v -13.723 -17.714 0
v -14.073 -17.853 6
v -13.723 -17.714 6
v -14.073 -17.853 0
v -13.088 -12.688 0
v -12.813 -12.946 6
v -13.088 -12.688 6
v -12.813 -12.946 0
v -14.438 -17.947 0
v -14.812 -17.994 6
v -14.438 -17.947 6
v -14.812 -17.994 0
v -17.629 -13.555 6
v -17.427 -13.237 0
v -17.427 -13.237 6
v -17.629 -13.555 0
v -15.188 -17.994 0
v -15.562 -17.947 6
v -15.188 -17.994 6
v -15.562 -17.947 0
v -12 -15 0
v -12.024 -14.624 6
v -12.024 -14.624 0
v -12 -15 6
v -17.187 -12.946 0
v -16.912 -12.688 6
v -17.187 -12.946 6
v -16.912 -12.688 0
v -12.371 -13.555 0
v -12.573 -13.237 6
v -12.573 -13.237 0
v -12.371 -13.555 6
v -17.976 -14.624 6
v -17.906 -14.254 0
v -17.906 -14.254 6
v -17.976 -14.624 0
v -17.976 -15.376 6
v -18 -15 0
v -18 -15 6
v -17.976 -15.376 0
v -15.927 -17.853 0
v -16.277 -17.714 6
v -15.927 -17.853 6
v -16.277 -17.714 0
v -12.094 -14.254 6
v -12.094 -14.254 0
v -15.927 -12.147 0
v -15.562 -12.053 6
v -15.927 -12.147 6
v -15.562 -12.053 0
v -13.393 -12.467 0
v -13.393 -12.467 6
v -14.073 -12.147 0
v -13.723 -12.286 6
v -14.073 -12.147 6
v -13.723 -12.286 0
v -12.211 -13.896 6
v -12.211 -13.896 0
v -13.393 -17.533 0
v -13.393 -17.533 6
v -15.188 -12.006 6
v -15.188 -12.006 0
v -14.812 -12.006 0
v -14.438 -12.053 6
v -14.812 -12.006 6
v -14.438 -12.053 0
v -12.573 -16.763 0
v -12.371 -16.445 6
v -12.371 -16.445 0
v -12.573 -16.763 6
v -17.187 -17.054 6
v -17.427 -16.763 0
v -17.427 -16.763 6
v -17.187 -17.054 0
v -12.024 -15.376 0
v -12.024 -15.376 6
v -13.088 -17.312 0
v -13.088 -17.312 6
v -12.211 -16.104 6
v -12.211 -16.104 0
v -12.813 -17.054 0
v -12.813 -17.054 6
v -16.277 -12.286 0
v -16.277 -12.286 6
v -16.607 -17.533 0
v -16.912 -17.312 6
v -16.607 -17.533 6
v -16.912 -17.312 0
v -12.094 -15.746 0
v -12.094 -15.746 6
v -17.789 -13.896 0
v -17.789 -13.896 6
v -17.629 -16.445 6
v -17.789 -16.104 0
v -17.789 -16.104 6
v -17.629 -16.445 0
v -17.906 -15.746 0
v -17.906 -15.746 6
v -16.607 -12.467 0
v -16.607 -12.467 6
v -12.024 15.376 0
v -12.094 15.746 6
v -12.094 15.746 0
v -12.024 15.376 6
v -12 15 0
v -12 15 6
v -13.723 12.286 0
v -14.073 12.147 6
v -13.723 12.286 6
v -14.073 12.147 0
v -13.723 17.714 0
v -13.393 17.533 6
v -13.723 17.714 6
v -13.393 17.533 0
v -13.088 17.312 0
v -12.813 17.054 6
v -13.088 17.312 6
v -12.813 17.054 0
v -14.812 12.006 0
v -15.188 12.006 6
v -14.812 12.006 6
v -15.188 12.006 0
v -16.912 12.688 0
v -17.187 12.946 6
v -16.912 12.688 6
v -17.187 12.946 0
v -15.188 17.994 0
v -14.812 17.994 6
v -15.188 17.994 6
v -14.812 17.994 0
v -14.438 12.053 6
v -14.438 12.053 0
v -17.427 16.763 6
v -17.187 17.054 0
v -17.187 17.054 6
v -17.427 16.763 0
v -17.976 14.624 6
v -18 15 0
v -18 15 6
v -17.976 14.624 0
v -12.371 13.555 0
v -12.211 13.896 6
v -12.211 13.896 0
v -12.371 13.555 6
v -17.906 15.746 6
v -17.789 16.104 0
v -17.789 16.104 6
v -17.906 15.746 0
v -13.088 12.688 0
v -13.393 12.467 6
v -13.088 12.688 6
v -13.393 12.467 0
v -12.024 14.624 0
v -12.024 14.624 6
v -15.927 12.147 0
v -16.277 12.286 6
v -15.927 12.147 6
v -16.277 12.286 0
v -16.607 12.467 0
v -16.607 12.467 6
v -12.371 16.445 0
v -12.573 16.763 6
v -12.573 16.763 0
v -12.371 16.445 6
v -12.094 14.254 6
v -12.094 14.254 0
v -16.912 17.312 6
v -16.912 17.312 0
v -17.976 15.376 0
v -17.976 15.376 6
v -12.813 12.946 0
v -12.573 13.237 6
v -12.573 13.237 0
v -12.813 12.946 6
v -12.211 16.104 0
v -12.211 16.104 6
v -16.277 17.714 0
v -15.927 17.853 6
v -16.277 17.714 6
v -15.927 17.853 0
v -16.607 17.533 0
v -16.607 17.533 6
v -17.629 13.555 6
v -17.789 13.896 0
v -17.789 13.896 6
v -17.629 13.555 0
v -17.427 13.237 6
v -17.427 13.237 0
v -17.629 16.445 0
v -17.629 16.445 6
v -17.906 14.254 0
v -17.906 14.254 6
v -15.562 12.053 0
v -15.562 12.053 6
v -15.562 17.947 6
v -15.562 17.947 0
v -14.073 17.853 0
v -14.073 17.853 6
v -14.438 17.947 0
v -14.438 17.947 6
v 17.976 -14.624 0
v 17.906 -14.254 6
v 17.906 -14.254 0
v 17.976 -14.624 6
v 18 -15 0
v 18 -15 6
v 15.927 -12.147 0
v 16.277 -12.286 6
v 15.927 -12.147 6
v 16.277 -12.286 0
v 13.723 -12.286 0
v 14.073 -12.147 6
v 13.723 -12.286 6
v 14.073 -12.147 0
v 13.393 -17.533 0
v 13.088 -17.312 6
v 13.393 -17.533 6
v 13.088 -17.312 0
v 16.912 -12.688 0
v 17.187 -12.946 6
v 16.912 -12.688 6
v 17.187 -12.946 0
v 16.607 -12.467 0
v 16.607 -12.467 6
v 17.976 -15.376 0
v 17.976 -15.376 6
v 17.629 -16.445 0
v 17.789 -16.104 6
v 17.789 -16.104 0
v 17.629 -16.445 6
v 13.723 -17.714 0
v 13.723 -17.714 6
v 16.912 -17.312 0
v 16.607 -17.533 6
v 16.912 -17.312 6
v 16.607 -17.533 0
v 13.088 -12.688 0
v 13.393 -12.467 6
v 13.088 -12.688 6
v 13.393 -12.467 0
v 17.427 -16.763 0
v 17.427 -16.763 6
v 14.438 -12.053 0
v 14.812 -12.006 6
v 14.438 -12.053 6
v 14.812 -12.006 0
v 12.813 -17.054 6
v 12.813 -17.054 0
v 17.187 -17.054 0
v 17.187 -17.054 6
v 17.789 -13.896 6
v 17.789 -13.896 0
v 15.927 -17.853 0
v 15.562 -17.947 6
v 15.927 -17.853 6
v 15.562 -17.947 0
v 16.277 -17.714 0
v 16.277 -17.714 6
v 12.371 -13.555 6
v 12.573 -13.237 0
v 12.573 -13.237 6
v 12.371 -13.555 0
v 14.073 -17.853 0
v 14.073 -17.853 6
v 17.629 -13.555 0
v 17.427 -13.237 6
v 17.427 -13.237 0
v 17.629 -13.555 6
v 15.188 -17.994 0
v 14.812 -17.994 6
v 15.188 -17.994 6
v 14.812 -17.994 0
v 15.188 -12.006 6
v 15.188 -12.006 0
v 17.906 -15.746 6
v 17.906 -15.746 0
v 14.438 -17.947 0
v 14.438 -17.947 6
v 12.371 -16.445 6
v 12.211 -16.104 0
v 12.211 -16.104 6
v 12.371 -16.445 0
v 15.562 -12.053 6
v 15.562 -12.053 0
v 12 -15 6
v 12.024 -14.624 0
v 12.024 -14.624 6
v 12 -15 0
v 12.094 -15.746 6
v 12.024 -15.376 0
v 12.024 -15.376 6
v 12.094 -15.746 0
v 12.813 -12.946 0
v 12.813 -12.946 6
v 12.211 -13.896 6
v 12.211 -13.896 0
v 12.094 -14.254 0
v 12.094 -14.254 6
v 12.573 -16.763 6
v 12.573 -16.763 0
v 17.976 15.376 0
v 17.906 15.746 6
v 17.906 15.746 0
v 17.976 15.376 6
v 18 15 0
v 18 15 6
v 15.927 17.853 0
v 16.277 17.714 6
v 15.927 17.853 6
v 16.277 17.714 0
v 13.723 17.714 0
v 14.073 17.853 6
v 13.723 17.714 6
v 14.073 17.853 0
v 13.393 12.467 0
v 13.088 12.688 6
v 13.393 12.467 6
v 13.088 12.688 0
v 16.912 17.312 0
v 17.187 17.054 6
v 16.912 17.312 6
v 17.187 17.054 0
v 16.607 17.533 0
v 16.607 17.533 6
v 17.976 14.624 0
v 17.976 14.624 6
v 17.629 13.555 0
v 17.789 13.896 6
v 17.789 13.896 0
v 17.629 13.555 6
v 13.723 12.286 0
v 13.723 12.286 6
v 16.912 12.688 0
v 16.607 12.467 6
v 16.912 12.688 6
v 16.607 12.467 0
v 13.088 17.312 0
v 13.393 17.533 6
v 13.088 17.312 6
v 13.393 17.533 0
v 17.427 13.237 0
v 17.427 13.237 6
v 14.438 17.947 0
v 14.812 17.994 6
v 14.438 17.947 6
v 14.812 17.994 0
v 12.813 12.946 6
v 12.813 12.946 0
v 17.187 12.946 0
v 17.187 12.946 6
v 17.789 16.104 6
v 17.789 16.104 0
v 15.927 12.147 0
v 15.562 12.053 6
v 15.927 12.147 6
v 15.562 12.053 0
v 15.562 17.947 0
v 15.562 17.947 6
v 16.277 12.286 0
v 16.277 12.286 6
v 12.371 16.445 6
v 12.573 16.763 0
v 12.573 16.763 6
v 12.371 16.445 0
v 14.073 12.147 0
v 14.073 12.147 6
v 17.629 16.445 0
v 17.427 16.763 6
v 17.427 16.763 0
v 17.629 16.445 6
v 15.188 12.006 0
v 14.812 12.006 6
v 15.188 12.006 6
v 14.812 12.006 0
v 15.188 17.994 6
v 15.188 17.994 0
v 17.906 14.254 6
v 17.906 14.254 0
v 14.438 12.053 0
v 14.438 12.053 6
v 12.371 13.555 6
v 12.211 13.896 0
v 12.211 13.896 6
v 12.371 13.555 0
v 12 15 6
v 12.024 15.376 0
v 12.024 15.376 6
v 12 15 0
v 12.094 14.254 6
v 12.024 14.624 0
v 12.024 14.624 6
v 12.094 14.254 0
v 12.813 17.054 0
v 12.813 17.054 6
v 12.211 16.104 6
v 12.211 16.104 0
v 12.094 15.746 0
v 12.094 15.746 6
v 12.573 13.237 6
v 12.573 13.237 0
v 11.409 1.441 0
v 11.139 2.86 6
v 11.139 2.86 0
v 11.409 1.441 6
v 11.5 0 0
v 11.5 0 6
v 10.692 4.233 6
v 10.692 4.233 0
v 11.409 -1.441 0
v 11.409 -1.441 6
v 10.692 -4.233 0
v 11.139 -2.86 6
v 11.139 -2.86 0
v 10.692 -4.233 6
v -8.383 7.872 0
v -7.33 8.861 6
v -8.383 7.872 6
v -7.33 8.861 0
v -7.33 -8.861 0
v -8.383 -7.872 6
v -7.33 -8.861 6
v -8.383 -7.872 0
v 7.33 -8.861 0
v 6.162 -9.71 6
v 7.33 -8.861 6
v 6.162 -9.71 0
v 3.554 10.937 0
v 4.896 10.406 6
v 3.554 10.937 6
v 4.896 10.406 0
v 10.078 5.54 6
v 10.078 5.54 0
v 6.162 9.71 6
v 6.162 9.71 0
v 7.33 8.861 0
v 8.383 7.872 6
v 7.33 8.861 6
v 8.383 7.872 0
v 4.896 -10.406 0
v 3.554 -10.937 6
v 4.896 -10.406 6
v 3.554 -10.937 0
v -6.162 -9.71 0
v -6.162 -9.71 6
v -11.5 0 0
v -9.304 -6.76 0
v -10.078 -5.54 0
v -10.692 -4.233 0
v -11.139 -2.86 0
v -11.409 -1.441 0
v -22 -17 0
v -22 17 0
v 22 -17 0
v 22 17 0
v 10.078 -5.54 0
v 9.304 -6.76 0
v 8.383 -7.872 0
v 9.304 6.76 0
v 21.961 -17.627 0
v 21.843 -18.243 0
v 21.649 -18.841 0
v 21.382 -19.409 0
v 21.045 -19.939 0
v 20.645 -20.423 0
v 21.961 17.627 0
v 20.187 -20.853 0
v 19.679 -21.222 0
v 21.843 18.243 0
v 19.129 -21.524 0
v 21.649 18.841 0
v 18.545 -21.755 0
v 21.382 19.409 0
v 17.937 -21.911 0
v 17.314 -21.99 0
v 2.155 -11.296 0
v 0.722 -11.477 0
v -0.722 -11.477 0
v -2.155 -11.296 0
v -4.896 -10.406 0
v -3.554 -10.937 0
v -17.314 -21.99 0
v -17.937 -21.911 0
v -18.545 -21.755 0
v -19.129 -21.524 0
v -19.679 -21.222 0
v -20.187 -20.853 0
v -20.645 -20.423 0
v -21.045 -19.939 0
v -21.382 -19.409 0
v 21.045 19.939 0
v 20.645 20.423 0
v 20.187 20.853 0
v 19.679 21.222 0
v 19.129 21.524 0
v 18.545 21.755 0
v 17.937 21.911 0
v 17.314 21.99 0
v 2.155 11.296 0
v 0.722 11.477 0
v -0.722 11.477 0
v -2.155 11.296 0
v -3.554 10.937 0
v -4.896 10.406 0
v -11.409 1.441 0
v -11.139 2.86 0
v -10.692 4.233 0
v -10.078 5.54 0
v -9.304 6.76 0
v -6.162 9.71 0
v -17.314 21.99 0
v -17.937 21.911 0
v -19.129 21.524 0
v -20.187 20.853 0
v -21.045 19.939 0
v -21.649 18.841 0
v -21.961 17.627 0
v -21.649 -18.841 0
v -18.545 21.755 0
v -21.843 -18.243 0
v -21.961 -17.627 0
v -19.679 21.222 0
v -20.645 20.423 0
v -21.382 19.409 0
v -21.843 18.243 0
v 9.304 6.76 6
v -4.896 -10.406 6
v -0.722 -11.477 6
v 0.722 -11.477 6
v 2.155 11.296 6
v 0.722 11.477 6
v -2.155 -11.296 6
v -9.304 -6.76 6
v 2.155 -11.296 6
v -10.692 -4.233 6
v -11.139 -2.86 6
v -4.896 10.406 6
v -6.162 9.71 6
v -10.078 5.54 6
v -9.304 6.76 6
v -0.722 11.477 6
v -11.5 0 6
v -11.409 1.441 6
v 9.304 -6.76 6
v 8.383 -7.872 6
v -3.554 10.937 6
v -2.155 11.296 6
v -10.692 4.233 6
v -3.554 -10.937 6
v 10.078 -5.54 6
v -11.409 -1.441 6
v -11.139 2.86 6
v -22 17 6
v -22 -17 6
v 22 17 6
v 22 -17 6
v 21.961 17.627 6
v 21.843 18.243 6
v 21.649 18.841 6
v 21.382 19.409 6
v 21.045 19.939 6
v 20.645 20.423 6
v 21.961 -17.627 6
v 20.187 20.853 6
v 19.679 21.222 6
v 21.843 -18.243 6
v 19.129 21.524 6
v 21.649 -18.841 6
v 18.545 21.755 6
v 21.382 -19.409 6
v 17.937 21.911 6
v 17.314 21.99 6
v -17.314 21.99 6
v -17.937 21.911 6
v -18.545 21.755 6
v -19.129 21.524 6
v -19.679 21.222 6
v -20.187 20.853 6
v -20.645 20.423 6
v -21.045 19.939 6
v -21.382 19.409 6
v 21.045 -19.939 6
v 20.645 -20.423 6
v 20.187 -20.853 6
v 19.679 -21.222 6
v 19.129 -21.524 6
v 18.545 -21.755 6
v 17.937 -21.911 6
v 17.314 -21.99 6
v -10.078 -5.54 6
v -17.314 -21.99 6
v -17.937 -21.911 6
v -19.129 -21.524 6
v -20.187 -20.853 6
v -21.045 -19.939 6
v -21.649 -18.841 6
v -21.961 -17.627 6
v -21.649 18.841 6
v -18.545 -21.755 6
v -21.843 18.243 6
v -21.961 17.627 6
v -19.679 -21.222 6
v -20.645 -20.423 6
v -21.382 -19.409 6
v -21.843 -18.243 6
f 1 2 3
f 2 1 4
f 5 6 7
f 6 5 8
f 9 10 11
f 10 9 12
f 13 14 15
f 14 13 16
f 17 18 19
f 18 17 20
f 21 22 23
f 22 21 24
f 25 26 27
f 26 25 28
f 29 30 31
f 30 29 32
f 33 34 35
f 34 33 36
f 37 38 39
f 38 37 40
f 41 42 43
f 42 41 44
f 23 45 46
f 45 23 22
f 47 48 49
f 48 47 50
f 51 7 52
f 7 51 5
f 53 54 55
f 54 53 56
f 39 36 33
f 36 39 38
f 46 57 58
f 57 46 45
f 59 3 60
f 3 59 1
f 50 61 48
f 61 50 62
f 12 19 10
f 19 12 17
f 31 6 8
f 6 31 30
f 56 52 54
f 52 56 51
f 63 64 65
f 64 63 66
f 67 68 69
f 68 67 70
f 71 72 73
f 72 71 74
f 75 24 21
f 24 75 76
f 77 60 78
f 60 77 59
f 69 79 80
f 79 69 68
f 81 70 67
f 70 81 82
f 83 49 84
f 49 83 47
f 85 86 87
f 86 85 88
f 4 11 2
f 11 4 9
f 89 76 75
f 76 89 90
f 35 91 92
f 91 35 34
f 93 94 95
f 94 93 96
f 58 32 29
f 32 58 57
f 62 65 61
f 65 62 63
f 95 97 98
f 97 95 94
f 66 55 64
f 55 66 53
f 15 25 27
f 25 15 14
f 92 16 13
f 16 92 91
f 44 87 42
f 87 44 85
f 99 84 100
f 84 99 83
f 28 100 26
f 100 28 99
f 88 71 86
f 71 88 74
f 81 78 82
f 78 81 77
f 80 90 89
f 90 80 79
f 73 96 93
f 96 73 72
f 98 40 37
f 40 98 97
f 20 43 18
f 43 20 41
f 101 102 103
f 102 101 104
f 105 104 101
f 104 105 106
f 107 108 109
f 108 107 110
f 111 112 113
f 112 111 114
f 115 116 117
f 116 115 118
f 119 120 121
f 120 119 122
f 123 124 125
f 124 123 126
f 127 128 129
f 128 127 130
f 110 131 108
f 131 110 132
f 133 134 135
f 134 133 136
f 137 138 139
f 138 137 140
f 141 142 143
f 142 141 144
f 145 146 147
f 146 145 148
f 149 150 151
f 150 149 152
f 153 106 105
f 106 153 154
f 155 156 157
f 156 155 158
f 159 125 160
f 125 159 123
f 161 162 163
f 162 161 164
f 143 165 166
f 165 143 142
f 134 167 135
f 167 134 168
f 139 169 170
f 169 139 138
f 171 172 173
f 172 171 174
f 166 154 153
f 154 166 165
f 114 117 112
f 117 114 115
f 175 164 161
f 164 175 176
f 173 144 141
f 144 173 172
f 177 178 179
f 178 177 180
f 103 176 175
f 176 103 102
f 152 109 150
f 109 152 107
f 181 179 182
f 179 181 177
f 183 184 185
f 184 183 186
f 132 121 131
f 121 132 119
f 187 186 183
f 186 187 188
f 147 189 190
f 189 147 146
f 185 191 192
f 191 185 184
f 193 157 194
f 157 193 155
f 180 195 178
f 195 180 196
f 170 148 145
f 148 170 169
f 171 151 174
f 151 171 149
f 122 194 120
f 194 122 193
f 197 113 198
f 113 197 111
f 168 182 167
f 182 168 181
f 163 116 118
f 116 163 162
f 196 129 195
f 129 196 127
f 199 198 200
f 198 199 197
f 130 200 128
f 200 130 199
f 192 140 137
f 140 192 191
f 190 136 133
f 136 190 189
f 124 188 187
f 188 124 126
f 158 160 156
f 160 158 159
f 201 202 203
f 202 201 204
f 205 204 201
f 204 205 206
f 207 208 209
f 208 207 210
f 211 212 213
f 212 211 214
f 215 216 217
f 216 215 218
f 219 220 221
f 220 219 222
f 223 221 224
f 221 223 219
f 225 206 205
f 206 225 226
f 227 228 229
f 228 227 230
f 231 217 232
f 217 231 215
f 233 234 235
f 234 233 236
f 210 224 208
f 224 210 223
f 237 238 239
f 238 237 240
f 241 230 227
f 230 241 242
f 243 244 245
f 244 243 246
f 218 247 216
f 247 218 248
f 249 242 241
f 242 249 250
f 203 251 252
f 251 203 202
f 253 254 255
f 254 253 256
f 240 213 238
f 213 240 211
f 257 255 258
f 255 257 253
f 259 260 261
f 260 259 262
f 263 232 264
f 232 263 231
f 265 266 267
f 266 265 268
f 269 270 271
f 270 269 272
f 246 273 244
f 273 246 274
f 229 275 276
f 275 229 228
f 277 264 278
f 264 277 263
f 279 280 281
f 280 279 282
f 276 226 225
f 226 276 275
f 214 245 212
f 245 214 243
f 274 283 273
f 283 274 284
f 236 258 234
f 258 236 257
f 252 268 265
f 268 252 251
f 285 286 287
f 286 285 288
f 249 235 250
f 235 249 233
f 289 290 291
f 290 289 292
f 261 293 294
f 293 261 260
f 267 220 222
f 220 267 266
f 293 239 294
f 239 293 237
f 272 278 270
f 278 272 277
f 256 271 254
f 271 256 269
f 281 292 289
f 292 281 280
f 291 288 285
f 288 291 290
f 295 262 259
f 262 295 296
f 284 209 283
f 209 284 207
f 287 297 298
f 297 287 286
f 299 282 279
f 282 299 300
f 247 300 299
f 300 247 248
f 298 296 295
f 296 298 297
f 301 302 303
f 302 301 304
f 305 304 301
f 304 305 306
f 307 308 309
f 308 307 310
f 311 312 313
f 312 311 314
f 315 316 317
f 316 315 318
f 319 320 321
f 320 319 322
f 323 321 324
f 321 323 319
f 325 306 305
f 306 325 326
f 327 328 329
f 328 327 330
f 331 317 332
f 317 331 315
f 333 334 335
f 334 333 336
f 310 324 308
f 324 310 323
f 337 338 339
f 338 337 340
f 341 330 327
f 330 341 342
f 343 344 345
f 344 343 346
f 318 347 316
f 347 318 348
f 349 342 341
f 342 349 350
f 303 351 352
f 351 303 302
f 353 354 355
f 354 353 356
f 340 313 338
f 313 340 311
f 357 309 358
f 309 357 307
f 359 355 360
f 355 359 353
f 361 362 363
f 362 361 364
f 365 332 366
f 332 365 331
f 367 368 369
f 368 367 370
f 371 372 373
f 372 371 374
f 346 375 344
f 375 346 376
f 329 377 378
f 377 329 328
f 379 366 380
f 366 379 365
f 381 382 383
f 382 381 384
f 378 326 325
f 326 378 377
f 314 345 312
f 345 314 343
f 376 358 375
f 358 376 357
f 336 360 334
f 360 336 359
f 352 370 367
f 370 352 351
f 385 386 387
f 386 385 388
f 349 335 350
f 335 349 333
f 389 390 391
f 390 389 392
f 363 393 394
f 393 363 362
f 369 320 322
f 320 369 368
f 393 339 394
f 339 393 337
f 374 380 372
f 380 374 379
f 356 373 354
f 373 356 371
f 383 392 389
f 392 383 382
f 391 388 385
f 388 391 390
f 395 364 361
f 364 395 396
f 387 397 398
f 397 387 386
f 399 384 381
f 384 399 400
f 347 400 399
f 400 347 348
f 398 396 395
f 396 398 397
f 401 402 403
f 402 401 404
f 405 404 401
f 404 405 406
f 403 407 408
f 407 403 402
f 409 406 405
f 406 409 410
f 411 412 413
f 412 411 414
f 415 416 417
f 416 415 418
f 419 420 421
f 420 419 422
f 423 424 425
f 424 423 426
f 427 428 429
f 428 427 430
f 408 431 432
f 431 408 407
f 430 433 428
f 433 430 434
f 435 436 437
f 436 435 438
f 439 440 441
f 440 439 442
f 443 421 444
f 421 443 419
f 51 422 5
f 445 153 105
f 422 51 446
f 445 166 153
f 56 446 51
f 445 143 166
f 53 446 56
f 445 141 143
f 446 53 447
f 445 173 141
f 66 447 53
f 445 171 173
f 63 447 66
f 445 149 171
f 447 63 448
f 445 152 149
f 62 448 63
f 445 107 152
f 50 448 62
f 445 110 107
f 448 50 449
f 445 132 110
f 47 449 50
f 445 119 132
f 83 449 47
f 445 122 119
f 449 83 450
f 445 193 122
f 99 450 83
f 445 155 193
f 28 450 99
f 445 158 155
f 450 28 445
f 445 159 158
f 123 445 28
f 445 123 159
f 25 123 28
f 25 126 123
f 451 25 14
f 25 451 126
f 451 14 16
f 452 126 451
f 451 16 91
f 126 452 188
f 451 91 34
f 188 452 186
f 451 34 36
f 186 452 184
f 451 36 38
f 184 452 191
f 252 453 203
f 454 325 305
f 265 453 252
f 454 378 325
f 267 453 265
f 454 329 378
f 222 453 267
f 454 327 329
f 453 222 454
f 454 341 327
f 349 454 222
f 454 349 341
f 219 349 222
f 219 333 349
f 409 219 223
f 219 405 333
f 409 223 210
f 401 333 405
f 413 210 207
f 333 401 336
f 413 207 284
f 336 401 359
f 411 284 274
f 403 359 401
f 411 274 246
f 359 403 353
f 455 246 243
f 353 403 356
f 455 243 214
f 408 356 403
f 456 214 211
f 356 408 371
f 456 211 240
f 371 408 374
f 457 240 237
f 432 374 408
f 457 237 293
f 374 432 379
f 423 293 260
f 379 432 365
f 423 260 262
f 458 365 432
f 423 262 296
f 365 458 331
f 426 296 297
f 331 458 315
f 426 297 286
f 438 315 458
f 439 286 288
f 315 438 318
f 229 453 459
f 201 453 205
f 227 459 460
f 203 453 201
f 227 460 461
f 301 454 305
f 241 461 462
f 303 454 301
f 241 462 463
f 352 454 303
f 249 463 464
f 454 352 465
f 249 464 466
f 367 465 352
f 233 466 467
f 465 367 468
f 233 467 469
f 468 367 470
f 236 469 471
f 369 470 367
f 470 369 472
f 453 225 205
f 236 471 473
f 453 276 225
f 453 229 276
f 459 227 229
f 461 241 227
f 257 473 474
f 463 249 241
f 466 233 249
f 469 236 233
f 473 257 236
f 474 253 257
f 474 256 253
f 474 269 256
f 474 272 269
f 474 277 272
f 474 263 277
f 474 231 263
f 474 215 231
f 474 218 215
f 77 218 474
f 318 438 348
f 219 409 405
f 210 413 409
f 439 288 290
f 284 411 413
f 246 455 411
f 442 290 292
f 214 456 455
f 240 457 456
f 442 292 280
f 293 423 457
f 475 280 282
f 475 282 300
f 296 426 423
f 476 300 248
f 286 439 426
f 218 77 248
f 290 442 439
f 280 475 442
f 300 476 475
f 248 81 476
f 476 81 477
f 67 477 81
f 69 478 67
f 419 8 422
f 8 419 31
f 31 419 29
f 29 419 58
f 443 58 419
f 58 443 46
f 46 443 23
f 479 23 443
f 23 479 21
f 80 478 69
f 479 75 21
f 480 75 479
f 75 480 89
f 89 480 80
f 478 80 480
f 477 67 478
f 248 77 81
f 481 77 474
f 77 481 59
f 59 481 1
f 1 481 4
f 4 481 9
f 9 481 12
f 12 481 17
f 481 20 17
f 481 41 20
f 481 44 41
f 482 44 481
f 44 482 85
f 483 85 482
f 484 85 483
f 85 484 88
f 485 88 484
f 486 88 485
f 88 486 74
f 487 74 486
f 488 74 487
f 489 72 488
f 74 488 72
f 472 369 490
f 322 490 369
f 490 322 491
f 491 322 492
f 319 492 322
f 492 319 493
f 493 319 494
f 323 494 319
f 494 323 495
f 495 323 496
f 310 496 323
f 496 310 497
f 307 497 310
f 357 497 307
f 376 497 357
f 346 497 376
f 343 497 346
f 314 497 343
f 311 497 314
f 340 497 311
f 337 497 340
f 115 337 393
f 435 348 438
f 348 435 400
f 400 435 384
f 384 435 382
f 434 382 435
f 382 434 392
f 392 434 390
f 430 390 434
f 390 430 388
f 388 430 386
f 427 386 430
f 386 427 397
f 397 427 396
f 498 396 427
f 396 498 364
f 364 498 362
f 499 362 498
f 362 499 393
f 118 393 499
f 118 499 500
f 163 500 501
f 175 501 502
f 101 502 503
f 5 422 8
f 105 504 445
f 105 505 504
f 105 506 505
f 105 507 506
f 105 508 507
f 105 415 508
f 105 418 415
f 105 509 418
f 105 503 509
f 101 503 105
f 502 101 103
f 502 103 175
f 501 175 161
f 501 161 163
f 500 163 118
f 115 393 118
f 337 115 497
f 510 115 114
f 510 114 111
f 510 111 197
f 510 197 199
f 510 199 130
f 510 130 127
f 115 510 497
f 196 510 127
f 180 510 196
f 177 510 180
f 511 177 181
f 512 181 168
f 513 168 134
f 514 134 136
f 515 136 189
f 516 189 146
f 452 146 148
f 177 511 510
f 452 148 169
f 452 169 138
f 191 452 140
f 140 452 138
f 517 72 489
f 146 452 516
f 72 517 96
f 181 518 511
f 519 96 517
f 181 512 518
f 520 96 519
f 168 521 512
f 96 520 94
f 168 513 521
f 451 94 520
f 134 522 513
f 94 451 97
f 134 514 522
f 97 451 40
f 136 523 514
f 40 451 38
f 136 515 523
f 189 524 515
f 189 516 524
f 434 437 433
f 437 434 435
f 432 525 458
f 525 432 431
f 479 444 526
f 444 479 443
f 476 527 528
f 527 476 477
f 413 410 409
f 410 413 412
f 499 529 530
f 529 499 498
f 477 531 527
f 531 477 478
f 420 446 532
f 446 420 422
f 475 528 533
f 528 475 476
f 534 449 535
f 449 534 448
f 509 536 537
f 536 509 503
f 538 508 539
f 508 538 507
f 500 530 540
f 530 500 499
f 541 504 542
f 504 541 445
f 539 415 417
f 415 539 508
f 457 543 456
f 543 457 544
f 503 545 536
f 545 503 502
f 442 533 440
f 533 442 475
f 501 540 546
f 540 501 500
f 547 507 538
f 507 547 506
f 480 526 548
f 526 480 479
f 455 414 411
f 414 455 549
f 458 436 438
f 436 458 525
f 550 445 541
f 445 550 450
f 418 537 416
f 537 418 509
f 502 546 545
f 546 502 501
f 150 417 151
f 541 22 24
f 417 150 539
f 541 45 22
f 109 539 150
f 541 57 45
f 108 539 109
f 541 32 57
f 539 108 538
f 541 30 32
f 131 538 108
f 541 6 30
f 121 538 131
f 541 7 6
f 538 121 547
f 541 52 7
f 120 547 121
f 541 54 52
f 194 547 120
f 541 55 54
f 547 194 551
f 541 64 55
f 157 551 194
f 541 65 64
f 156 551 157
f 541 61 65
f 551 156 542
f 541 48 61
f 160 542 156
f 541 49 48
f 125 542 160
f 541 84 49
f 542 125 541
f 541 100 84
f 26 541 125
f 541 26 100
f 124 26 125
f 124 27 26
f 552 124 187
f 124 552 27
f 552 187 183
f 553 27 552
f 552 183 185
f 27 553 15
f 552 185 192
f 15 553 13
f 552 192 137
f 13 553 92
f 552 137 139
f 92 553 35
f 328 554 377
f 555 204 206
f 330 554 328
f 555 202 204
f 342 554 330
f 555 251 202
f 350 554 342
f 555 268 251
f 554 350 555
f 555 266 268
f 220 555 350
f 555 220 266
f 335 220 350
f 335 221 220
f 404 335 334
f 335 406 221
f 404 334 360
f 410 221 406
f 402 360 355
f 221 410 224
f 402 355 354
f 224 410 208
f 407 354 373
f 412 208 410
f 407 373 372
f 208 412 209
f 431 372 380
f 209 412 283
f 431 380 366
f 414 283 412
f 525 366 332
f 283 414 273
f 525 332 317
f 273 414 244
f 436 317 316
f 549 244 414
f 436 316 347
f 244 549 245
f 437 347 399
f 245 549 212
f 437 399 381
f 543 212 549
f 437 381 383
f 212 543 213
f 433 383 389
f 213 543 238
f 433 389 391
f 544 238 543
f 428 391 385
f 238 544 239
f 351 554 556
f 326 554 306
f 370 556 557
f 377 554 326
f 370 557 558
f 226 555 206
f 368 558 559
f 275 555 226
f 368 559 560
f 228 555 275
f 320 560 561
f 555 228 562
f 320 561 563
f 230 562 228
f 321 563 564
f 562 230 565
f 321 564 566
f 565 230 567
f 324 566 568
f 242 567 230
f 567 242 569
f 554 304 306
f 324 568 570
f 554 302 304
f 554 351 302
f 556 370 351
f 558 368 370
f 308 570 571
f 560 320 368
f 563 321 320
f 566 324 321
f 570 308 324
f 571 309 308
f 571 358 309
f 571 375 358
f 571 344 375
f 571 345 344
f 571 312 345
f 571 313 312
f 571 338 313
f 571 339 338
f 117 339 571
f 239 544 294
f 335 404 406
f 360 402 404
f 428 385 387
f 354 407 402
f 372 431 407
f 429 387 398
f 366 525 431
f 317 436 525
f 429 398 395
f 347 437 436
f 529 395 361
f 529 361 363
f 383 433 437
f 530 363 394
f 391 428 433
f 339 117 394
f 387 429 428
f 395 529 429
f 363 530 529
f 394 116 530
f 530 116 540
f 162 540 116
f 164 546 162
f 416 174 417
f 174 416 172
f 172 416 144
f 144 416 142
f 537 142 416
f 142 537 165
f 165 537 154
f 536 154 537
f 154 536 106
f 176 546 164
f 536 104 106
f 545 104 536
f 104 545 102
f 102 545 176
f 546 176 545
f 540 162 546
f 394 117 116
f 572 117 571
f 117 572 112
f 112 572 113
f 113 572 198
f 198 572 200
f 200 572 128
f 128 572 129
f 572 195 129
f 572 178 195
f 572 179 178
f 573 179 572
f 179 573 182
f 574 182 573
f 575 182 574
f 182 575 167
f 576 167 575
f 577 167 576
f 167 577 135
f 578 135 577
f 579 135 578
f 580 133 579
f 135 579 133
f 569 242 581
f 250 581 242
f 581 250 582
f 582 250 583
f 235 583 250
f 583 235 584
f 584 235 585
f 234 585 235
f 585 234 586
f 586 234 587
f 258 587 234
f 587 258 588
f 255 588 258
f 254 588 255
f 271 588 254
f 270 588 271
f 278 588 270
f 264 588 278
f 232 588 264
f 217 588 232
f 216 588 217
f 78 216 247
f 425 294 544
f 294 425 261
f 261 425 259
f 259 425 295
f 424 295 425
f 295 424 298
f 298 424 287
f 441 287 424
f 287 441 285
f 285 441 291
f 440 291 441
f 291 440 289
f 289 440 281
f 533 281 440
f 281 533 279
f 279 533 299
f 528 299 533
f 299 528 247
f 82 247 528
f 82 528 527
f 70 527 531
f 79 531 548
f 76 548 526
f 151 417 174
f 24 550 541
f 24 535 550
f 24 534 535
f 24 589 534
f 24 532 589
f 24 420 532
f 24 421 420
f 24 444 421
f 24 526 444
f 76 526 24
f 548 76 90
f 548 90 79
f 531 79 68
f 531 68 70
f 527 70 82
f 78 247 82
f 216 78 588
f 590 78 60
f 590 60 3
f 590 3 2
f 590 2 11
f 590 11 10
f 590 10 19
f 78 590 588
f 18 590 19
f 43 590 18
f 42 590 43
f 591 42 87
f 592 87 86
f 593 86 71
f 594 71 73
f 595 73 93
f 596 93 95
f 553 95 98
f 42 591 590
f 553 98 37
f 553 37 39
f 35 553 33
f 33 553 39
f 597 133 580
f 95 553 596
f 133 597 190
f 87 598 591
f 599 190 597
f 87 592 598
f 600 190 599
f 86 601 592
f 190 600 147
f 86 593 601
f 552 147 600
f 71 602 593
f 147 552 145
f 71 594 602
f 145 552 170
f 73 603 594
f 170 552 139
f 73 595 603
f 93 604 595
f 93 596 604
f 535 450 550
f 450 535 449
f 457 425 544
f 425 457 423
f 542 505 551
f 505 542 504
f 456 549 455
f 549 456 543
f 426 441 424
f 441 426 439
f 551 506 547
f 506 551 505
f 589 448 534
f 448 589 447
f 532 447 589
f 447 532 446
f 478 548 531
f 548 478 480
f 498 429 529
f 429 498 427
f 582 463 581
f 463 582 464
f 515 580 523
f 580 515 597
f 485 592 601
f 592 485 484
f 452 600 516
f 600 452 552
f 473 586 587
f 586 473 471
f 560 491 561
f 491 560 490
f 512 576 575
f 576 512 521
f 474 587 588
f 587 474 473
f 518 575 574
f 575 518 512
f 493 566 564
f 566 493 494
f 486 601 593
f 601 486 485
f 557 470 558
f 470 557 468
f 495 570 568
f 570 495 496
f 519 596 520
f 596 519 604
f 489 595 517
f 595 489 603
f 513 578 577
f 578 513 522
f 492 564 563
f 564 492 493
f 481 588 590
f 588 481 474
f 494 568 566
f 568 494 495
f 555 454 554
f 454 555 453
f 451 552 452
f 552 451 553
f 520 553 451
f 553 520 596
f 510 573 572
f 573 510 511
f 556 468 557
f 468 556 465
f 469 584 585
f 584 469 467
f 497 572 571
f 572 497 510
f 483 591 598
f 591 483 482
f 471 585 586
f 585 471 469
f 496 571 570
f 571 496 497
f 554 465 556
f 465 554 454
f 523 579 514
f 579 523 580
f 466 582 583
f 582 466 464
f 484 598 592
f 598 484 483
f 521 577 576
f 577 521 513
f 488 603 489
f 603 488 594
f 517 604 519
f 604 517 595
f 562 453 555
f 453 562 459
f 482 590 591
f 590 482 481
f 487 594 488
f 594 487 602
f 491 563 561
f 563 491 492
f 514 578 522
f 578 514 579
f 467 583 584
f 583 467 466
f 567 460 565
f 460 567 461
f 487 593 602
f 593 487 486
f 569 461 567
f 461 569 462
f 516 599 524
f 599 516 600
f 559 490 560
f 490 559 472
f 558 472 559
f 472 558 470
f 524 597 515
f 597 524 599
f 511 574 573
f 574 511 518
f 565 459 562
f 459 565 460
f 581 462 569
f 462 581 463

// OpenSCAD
$fn = 50;


difference() {
	union() {
		hull() {
			translate(v = [-17.0000000000, 17.0000000000, 0]) {
				cylinder(h = 6, r = 5);
			}
			translate(v = [17.0000000000, 17.0000000000, 0]) {
				cylinder(h = 6, r = 5);
			}
			translate(v = [-17.0000000000, -17.0000000000, 0]) {
				cylinder(h = 6, r = 5);
			}
			translate(v = [17.0000000000, -17.0000000000, 0]) {
				cylinder(h = 6, r = 5);
			}
		}
	}
	union() {
		#translate(v = [-15.0000000000, -15.0000000000, -100.0000000000]) {
			cylinder(h = 200, r = 3.0000000000);
		}
		#translate(v = [-15.0000000000, 15.0000000000, -100.0000000000]) {
			cylinder(h = 200, r = 3.0000000000);
		}
		#translate(v = [15.0000000000, -15.0000000000, -100.0000000000]) {
			cylinder(h = 200, r = 3.0000000000);
		}
		#translate(v = [15.0000000000, 15.0000000000, -100.0000000000]) {
			cylinder(h = 200, r = 3.0000000000);
		}
		#cylinder(h = 6, r = 11.5000000000);
	}
}
